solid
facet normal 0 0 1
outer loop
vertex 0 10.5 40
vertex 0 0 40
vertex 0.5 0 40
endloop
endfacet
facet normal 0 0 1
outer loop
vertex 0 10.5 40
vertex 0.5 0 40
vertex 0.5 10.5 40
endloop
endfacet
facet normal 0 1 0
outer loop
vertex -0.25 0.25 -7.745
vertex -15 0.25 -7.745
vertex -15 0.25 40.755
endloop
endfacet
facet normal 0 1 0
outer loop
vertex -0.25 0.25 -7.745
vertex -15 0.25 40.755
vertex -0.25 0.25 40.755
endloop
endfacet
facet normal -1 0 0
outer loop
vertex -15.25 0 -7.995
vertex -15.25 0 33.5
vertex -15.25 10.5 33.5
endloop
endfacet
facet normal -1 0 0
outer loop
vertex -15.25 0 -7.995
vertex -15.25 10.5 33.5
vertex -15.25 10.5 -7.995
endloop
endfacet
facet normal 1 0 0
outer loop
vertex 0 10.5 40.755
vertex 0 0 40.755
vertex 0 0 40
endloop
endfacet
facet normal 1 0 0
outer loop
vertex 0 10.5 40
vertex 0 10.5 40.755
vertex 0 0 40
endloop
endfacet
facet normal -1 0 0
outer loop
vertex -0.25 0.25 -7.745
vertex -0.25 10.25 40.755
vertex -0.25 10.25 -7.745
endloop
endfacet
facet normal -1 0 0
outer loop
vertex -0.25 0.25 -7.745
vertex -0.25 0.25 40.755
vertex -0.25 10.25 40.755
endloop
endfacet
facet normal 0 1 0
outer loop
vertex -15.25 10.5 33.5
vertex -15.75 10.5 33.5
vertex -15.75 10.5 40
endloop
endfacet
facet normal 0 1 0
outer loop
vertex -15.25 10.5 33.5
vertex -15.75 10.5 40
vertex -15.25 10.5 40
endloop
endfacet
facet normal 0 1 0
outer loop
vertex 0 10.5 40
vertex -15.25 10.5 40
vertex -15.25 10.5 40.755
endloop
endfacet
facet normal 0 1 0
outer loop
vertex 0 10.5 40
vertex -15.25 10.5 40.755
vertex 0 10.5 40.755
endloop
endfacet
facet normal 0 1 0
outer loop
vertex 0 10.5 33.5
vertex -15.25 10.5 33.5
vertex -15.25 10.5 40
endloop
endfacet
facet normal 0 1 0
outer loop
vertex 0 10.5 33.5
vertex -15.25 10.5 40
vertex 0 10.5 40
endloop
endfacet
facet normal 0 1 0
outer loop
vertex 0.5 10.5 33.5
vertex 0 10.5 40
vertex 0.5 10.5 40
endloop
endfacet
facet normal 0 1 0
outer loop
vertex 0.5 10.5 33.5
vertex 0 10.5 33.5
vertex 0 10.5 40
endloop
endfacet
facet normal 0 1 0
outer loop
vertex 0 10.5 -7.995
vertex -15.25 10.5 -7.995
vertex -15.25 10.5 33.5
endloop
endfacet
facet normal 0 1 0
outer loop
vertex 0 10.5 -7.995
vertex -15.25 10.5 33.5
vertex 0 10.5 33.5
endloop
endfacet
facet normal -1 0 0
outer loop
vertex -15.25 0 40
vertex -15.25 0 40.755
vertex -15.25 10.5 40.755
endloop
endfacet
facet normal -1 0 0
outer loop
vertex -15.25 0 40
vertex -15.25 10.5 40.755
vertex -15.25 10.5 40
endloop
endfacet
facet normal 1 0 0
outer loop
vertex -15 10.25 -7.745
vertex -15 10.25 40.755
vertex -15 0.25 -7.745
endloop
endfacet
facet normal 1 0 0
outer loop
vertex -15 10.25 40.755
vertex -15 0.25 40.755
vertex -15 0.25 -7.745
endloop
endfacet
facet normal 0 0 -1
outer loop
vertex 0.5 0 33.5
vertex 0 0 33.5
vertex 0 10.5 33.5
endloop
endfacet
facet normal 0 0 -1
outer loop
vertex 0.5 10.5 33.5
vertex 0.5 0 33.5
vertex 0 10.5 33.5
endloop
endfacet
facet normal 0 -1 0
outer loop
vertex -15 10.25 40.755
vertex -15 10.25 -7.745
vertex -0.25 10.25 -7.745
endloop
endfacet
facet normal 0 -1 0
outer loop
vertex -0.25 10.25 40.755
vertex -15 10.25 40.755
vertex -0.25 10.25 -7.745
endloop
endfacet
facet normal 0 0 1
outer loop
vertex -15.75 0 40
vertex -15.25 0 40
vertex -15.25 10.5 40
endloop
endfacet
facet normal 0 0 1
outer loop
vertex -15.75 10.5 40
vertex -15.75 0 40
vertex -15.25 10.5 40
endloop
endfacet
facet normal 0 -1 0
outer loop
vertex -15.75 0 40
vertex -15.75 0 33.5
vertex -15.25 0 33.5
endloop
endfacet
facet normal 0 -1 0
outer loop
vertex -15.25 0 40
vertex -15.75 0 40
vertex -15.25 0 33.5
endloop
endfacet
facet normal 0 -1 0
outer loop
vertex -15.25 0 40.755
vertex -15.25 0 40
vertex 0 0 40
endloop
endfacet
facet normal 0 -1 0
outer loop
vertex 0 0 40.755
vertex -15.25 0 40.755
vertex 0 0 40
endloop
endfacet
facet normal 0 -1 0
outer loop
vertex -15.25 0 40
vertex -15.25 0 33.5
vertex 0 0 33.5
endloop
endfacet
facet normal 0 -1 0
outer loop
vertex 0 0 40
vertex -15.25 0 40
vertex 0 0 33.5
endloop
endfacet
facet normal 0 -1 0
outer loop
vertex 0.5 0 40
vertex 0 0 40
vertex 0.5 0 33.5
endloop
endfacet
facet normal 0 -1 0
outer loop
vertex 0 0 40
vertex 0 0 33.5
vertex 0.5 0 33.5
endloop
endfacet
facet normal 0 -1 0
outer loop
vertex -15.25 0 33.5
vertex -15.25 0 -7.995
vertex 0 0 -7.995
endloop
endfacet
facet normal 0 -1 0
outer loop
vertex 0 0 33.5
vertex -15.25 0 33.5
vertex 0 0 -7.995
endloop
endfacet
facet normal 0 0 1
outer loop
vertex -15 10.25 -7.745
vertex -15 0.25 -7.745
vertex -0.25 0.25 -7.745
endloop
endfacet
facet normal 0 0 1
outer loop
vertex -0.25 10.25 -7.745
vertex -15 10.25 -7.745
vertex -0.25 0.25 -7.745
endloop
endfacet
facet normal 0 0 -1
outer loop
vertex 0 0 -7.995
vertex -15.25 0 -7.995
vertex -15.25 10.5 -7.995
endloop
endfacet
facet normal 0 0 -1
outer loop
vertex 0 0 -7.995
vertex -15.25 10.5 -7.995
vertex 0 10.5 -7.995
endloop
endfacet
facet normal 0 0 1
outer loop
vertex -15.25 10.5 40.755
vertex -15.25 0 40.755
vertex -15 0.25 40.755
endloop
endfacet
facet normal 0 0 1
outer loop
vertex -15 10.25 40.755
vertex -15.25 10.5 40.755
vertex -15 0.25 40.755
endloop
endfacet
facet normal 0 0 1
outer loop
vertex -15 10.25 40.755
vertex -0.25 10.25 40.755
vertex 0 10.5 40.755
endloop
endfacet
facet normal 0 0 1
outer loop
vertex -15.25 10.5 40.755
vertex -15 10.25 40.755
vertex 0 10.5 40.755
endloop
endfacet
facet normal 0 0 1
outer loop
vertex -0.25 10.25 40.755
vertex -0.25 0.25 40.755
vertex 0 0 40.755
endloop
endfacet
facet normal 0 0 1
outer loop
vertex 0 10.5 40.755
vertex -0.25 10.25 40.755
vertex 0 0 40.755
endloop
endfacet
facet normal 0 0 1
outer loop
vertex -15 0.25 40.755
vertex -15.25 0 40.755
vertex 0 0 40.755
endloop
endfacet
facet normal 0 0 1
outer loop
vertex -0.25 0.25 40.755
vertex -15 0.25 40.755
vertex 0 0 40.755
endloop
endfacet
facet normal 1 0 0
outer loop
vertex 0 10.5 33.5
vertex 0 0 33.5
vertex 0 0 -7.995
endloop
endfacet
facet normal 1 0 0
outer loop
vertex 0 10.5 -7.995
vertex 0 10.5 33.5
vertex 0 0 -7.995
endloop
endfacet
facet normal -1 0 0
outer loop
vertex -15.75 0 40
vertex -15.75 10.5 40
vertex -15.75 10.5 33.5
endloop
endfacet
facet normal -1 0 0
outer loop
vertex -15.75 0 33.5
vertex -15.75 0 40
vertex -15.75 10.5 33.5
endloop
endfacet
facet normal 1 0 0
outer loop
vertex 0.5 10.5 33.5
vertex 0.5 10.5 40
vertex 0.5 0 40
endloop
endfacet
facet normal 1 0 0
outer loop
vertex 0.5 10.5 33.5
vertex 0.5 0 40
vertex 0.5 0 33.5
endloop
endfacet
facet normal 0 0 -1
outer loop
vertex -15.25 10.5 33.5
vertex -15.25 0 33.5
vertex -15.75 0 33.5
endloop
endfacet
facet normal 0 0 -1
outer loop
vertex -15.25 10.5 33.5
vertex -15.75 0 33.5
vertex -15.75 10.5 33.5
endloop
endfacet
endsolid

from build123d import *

# Parameters (mm, degrees)
SKETCH1_W           = 15.25
SKETCH1_H           = 48.75
BOSS_EXTRUDE1_DEPTH = 10.5
SHELL1_T            = -0.25
SKETCH3_W           = 6.5
SKETCH3_H           = 10.5
BOSS_EXTRUDE2_DEPTH = 0.5


with BuildPart() as part:
    # Sketch1 → Boss-Extrude1 (new body)
    with BuildSketch(Plane(origin=(0, 0, 0), x_dir=(1, 0, 0), z_dir=(0, 1, 0))):
        with Locations((-7.625, -16.379710312)):
            Rectangle(SKETCH1_W, SKETCH1_H)
    extrude(amount=BOSS_EXTRUDE1_DEPTH)

    # Shell1
    shell1_openings = [part.faces().sort_by_distance(p)[0] for p in [
        (-7.625, 5.25, 40.754710312),
    ]]
    offset(amount=SHELL1_T, openings=shell1_openings, kind=Kind.INTERSECTION)

    # Sketch3 → Boss-Extrude2 (add)
    with BuildSketch(Plane(origin=(0, 0, 0), x_dir=(0, 0, -1), z_dir=(1, 0, 0))):
        with Locations((-36.75, 5.25)):
            Rectangle(SKETCH3_W, SKETCH3_H)
    boss_extrude2 = extrude(amount=BOSS_EXTRUDE2_DEPTH)

    # Mirror1: Boss-Extrude2 across plane
    add(boss_extrude2.mirror(Plane.ZY.offset(7.625)))


solid = part.part
